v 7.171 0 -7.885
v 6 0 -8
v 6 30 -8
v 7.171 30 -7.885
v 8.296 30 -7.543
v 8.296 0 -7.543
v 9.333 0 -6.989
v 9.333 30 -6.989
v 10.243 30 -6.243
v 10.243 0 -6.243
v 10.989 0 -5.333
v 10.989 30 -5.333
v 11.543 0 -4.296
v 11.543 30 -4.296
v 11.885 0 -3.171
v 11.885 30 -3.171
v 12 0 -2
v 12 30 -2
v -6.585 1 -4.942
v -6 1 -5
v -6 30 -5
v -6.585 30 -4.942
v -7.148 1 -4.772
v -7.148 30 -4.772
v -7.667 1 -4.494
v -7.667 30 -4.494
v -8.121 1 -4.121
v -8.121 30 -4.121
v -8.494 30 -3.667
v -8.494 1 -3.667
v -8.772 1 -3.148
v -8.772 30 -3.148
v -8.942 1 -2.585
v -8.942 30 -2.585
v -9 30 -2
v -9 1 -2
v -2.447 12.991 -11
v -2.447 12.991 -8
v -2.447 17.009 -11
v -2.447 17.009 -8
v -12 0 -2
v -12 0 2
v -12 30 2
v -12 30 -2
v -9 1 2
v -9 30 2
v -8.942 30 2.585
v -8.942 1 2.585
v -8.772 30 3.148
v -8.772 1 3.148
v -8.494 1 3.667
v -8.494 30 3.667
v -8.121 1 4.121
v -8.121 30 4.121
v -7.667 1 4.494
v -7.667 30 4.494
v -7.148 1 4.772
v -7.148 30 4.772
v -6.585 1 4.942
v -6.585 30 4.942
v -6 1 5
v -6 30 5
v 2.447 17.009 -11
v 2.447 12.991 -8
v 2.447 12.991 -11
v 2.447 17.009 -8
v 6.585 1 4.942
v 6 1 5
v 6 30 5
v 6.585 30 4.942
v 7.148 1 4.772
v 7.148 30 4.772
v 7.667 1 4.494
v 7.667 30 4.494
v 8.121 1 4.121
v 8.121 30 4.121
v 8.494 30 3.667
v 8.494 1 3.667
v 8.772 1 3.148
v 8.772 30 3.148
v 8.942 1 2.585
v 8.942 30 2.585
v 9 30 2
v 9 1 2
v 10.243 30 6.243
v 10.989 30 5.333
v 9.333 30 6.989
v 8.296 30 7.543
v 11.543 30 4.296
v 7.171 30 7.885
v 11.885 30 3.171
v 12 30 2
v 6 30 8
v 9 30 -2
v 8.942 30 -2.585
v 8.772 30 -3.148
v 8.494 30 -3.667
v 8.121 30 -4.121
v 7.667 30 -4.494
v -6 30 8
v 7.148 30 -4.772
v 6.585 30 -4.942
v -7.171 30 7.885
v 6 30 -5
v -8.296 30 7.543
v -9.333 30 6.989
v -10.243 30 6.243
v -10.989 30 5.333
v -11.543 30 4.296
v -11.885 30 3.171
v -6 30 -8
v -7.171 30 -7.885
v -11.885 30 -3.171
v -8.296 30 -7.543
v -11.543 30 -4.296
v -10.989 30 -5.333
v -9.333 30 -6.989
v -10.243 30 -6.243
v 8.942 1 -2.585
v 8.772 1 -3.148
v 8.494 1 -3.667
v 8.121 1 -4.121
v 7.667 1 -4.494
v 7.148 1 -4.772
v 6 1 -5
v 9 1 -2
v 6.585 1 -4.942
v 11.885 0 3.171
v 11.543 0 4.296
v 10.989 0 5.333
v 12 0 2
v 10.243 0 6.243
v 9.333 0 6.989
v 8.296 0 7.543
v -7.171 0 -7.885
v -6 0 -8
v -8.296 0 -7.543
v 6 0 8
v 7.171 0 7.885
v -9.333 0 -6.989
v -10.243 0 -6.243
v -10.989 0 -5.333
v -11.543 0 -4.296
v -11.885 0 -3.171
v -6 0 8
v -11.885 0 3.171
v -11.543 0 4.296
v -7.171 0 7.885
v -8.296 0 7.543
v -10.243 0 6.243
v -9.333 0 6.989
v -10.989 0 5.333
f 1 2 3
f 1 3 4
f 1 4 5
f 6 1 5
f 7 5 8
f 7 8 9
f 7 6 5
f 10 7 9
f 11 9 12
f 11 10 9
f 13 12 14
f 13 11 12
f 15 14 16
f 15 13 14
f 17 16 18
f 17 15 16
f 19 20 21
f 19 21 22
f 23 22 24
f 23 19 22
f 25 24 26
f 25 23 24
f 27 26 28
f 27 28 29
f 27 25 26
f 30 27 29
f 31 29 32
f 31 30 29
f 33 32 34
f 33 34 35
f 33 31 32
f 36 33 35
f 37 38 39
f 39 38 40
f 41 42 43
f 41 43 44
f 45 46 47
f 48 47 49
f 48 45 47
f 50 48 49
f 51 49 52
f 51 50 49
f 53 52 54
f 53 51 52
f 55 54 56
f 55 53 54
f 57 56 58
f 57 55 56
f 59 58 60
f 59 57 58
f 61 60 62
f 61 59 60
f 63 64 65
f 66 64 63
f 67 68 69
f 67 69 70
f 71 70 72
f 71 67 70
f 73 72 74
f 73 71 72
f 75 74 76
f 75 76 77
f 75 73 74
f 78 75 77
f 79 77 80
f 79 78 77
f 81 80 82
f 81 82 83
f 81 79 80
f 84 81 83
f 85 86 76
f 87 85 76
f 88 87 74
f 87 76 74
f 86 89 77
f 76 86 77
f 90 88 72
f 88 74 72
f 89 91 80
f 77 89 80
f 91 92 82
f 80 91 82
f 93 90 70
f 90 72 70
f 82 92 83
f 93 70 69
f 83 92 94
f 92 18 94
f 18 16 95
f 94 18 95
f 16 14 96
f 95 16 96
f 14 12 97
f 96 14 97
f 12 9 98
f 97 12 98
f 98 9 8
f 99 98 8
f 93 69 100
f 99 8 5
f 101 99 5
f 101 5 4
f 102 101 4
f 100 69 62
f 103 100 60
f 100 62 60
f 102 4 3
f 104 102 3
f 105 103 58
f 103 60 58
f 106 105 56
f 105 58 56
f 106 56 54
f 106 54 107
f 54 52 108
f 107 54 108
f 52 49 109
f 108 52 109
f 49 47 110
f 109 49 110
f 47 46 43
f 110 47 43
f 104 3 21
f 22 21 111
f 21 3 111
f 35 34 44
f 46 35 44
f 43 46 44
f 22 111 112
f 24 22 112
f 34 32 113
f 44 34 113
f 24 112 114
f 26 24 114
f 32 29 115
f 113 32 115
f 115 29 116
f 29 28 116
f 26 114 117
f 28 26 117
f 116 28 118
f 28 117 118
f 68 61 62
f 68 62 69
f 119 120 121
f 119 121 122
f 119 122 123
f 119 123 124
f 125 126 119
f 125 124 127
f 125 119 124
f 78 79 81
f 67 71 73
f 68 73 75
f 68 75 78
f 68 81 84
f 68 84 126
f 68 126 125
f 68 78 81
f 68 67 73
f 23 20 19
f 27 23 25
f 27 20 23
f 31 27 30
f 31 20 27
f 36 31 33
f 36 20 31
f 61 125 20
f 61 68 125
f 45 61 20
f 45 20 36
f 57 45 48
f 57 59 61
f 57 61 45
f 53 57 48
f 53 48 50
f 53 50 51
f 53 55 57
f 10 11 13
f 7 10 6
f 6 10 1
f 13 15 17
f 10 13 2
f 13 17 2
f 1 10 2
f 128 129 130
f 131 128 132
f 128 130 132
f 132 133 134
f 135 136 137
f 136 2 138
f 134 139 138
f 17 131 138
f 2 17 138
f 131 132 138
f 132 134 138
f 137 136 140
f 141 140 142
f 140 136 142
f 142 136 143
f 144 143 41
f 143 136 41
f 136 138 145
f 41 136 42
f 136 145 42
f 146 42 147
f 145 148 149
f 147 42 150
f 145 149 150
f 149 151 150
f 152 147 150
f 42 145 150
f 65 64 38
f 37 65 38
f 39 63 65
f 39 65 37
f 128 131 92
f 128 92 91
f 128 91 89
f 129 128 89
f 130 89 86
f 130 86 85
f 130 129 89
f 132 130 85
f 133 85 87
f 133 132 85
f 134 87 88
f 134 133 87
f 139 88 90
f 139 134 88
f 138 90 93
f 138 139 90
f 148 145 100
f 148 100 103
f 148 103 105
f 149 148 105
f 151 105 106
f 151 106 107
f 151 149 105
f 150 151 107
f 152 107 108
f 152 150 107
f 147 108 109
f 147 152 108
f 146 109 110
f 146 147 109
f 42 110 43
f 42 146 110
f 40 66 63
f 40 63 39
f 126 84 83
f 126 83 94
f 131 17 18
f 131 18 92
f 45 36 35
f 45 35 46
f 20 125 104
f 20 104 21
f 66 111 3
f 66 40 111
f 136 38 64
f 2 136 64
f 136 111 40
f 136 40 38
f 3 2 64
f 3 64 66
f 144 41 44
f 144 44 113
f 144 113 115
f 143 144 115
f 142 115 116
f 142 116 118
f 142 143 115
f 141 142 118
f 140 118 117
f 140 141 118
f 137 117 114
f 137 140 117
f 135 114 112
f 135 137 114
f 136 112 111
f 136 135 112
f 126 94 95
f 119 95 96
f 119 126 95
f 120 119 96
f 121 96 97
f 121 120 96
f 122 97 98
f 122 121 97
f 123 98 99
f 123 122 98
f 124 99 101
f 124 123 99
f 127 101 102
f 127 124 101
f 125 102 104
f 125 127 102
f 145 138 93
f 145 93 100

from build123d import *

# Parameters (mm, degrees)
SALIENTE_EXTRUIR1_DEPTH = 30
CROQUIS3_W              = 4.89350096
CROQUIS3_H              = 4.01782184
SALIENTE_EXTRUIR2_DEPTH = 3
SALIENTE_EXTRUIR3_DEPTH = 1


with BuildPart() as part:
    # Croquis1 → Saliente-Extruir1 (new body)
    with BuildSketch(Plane(origin=(0, 0, 0), x_dir=(1, 0, 0), z_dir=(0, 1, 0))):
        with BuildLine():
            Line((-6, 8), (6, 8))
            ThreePointArc((6, 8), (10.242640687, 6.242640687), (12, 2))
            Line((12, 2), (12, -2))
            ThreePointArc((12, -2), (10.242640687, -6.242640687), (6, -8))
            Line((6, -8), (-6, -8))
            ThreePointArc((-6, -8), (-10.242640687, -6.242640687), (-12, -2))
            Line((-12, -2), (-12, 2))
            ThreePointArc((-12, 2), (-10.242640687, 6.242640687), (-6, 8))
        make_face()
        with BuildLine():
            Line((-6, -5), (6, -5))
            ThreePointArc((6, -5), (8.121320344, -4.121320344), (9, -2))
            Line((9, -2), (9, 2))
            ThreePointArc((9, 2), (8.121320344, 4.121320344), (6, 5))
            Line((6, 5), (-6, 5))
            ThreePointArc((-6, 5), (-8.121320344, 4.121320344), (-9, 2))
            Line((-9, 2), (-9, -2))
            ThreePointArc((-9, -2), (-8.121320344, -4.121320344), (-6, -5))
        make_face(mode=Mode.SUBTRACT)
    extrude(amount=SALIENTE_EXTRUIR1_DEPTH)

    # Croquis3 → Saliente-Extruir2 (add)
    with BuildSketch(Plane(origin=(0, 0, -8), x_dir=(-1, 0, 0), z_dir=(0, 0, -1))):
        with Locations((0, 15)):
            Rectangle(CROQUIS3_W, CROQUIS3_H)
    extrude(amount=SALIENTE_EXTRUIR2_DEPTH)

    # Croquis5 → Saliente-Extruir3 (add)
    with BuildSketch(Plane.XZ):
        with BuildLine():
            Line((6, -5), (-6, -5))
            ThreePointArc((-6, -5), (-8.121320344, -4.121320344), (-9, -2))
            Line((-9, -2), (-9, 2))
            ThreePointArc((-9, 2), (-8.121320344, 4.121320344), (-6, 5))
            Line((-6, 5), (6, 5))
            ThreePointArc((6, 5), (8.121320344, 4.121320344), (9, 2))
            Line((9, 2), (9, -2))
            ThreePointArc((9, -2), (8.121320344, -4.121320344), (6, -5))
        make_face()
    extrude(amount=-SALIENTE_EXTRUIR3_DEPTH)


solid = part.part
